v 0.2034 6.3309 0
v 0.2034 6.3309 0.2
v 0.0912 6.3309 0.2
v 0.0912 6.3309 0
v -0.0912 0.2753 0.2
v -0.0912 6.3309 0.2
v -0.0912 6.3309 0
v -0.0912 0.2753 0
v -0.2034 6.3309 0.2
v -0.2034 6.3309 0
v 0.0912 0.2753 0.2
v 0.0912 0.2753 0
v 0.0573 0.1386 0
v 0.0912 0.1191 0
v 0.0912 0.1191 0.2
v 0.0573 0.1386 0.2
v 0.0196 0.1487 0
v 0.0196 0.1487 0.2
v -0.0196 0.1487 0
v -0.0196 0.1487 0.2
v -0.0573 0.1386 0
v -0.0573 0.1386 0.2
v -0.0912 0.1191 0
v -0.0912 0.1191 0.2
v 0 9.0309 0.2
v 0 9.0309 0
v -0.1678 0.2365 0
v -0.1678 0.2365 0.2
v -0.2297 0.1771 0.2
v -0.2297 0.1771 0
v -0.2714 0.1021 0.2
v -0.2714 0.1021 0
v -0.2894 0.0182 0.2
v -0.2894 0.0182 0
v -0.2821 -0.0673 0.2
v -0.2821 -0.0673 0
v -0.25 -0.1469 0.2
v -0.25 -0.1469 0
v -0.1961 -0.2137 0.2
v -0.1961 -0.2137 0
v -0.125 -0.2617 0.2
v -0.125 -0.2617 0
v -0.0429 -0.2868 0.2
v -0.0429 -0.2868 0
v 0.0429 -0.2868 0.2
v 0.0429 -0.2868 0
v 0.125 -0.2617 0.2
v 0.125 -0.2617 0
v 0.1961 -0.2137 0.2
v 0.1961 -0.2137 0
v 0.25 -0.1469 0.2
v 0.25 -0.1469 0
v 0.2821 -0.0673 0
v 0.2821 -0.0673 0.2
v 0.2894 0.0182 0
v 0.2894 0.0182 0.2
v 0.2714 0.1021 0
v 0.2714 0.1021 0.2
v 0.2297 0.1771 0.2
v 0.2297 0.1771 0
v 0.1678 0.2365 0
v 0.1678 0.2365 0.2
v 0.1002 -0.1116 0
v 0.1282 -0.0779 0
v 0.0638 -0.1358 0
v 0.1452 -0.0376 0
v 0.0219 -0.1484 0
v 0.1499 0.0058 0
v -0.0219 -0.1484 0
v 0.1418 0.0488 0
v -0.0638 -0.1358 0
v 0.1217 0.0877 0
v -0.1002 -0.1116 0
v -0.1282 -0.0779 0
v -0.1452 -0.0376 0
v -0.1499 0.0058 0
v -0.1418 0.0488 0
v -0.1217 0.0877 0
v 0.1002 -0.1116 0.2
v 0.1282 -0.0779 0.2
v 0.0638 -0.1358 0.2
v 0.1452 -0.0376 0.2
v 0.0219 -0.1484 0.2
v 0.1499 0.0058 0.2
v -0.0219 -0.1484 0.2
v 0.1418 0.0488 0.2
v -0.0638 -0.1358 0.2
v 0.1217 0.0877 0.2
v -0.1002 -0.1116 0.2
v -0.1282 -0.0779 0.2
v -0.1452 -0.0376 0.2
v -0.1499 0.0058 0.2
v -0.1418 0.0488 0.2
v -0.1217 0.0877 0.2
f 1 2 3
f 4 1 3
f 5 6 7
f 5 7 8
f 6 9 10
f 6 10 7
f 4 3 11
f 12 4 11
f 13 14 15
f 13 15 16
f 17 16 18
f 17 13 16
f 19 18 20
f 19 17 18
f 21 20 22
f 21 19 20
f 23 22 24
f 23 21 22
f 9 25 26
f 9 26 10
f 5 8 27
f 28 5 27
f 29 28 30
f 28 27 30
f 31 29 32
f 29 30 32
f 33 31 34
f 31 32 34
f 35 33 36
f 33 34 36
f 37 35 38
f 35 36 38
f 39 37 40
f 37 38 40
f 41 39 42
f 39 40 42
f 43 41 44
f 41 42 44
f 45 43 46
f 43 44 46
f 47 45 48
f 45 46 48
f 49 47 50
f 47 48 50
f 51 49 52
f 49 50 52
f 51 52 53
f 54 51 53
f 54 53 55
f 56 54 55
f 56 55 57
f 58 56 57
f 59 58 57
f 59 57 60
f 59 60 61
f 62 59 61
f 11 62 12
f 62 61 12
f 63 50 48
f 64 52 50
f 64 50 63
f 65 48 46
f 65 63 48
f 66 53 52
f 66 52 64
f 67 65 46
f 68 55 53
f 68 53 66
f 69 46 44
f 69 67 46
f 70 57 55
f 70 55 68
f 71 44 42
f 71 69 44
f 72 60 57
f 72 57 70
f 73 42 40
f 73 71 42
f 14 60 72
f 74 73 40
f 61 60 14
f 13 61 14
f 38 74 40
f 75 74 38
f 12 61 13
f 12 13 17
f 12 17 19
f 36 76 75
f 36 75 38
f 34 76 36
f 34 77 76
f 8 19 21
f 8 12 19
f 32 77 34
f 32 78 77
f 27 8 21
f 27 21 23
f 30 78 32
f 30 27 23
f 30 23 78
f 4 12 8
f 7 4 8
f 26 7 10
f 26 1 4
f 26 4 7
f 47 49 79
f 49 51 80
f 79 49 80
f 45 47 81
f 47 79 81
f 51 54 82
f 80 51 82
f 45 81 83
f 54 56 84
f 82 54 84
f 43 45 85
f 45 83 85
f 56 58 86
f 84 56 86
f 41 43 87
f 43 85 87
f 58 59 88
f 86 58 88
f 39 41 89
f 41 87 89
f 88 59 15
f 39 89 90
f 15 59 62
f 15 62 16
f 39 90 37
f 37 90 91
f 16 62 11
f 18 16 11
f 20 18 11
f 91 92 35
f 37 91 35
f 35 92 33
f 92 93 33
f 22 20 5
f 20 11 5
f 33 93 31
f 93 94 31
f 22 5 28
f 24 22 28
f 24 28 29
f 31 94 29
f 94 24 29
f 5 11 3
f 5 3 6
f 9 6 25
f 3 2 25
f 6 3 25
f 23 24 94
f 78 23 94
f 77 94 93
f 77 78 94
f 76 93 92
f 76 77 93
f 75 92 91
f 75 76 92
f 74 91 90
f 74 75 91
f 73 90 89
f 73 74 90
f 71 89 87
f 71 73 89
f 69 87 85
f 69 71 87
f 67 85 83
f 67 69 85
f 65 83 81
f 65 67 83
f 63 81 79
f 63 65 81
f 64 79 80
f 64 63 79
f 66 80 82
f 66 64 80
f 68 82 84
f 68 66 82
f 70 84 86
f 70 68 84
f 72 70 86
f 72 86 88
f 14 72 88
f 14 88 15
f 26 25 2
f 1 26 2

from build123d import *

# Parameters (mm, degrees)
SKETCH_2_R          = 0.29
SKETCH_2_R_2        = 0.15
EXTRUDE_1_DEPTH     = 0.2
EXTRUDE_3_DEPTH     = 0.2
CUT_EXTRUDE_START   = -0.2
CUT_EXTRUDE_2_DEPTH = 0.2


# Read off the part's stored shape, not the designer's step: 切除-拉伸2
with BuildPart() as part:
    # 草图2 → 凸台-拉伸1 (new body)
    with BuildSketch(Plane.XY):
        Circle(SKETCH_2_R)
        Circle(SKETCH_2_R_2, mode=Mode.SUBTRACT)
    extrude(amount=EXTRUDE_1_DEPTH)

    # 草图3 → 凸台-拉伸3 (add)
    with BuildSketch(Plane.XY.offset(0.2)):
        Polygon((0, 0), (0, 9.030931314), (-0.203353638, 6.330931314), (-0.091221417, 6.330931314), (-0.091221417, 0), align=None)
    extrude_3 = extrude(amount=-EXTRUDE_3_DEPTH)

    # 镜向1: 凸台-拉伸3 across plane
    add(extrude_3.mirror(Plane(origin=(0, 0, 0), x_dir=(0, 0, 1), z_dir=(1, 0, 0))))

    # 切除-拉伸2 outline → 切除-拉伸2 (cut)
    with BuildSketch(Plane.XY.offset(0.2).offset(CUT_EXTRUDE_START)):
        with BuildLine():
            Line((0.091221417, 0), (0.091221417, 0.11907415))
            ThreePointArc((0.091221417, 0.11907415), (0, 0.15), (-0.091221417, 0.11907415))
            Line((-0.091221417, 0.11907415), (-0.091221417, 0))
            Line((-0.091221417, 0), (0.091221417, 0))
        make_face()
    extrude(amount=CUT_EXTRUDE_2_DEPTH, mode=Mode.SUBTRACT)


solid = part.part
